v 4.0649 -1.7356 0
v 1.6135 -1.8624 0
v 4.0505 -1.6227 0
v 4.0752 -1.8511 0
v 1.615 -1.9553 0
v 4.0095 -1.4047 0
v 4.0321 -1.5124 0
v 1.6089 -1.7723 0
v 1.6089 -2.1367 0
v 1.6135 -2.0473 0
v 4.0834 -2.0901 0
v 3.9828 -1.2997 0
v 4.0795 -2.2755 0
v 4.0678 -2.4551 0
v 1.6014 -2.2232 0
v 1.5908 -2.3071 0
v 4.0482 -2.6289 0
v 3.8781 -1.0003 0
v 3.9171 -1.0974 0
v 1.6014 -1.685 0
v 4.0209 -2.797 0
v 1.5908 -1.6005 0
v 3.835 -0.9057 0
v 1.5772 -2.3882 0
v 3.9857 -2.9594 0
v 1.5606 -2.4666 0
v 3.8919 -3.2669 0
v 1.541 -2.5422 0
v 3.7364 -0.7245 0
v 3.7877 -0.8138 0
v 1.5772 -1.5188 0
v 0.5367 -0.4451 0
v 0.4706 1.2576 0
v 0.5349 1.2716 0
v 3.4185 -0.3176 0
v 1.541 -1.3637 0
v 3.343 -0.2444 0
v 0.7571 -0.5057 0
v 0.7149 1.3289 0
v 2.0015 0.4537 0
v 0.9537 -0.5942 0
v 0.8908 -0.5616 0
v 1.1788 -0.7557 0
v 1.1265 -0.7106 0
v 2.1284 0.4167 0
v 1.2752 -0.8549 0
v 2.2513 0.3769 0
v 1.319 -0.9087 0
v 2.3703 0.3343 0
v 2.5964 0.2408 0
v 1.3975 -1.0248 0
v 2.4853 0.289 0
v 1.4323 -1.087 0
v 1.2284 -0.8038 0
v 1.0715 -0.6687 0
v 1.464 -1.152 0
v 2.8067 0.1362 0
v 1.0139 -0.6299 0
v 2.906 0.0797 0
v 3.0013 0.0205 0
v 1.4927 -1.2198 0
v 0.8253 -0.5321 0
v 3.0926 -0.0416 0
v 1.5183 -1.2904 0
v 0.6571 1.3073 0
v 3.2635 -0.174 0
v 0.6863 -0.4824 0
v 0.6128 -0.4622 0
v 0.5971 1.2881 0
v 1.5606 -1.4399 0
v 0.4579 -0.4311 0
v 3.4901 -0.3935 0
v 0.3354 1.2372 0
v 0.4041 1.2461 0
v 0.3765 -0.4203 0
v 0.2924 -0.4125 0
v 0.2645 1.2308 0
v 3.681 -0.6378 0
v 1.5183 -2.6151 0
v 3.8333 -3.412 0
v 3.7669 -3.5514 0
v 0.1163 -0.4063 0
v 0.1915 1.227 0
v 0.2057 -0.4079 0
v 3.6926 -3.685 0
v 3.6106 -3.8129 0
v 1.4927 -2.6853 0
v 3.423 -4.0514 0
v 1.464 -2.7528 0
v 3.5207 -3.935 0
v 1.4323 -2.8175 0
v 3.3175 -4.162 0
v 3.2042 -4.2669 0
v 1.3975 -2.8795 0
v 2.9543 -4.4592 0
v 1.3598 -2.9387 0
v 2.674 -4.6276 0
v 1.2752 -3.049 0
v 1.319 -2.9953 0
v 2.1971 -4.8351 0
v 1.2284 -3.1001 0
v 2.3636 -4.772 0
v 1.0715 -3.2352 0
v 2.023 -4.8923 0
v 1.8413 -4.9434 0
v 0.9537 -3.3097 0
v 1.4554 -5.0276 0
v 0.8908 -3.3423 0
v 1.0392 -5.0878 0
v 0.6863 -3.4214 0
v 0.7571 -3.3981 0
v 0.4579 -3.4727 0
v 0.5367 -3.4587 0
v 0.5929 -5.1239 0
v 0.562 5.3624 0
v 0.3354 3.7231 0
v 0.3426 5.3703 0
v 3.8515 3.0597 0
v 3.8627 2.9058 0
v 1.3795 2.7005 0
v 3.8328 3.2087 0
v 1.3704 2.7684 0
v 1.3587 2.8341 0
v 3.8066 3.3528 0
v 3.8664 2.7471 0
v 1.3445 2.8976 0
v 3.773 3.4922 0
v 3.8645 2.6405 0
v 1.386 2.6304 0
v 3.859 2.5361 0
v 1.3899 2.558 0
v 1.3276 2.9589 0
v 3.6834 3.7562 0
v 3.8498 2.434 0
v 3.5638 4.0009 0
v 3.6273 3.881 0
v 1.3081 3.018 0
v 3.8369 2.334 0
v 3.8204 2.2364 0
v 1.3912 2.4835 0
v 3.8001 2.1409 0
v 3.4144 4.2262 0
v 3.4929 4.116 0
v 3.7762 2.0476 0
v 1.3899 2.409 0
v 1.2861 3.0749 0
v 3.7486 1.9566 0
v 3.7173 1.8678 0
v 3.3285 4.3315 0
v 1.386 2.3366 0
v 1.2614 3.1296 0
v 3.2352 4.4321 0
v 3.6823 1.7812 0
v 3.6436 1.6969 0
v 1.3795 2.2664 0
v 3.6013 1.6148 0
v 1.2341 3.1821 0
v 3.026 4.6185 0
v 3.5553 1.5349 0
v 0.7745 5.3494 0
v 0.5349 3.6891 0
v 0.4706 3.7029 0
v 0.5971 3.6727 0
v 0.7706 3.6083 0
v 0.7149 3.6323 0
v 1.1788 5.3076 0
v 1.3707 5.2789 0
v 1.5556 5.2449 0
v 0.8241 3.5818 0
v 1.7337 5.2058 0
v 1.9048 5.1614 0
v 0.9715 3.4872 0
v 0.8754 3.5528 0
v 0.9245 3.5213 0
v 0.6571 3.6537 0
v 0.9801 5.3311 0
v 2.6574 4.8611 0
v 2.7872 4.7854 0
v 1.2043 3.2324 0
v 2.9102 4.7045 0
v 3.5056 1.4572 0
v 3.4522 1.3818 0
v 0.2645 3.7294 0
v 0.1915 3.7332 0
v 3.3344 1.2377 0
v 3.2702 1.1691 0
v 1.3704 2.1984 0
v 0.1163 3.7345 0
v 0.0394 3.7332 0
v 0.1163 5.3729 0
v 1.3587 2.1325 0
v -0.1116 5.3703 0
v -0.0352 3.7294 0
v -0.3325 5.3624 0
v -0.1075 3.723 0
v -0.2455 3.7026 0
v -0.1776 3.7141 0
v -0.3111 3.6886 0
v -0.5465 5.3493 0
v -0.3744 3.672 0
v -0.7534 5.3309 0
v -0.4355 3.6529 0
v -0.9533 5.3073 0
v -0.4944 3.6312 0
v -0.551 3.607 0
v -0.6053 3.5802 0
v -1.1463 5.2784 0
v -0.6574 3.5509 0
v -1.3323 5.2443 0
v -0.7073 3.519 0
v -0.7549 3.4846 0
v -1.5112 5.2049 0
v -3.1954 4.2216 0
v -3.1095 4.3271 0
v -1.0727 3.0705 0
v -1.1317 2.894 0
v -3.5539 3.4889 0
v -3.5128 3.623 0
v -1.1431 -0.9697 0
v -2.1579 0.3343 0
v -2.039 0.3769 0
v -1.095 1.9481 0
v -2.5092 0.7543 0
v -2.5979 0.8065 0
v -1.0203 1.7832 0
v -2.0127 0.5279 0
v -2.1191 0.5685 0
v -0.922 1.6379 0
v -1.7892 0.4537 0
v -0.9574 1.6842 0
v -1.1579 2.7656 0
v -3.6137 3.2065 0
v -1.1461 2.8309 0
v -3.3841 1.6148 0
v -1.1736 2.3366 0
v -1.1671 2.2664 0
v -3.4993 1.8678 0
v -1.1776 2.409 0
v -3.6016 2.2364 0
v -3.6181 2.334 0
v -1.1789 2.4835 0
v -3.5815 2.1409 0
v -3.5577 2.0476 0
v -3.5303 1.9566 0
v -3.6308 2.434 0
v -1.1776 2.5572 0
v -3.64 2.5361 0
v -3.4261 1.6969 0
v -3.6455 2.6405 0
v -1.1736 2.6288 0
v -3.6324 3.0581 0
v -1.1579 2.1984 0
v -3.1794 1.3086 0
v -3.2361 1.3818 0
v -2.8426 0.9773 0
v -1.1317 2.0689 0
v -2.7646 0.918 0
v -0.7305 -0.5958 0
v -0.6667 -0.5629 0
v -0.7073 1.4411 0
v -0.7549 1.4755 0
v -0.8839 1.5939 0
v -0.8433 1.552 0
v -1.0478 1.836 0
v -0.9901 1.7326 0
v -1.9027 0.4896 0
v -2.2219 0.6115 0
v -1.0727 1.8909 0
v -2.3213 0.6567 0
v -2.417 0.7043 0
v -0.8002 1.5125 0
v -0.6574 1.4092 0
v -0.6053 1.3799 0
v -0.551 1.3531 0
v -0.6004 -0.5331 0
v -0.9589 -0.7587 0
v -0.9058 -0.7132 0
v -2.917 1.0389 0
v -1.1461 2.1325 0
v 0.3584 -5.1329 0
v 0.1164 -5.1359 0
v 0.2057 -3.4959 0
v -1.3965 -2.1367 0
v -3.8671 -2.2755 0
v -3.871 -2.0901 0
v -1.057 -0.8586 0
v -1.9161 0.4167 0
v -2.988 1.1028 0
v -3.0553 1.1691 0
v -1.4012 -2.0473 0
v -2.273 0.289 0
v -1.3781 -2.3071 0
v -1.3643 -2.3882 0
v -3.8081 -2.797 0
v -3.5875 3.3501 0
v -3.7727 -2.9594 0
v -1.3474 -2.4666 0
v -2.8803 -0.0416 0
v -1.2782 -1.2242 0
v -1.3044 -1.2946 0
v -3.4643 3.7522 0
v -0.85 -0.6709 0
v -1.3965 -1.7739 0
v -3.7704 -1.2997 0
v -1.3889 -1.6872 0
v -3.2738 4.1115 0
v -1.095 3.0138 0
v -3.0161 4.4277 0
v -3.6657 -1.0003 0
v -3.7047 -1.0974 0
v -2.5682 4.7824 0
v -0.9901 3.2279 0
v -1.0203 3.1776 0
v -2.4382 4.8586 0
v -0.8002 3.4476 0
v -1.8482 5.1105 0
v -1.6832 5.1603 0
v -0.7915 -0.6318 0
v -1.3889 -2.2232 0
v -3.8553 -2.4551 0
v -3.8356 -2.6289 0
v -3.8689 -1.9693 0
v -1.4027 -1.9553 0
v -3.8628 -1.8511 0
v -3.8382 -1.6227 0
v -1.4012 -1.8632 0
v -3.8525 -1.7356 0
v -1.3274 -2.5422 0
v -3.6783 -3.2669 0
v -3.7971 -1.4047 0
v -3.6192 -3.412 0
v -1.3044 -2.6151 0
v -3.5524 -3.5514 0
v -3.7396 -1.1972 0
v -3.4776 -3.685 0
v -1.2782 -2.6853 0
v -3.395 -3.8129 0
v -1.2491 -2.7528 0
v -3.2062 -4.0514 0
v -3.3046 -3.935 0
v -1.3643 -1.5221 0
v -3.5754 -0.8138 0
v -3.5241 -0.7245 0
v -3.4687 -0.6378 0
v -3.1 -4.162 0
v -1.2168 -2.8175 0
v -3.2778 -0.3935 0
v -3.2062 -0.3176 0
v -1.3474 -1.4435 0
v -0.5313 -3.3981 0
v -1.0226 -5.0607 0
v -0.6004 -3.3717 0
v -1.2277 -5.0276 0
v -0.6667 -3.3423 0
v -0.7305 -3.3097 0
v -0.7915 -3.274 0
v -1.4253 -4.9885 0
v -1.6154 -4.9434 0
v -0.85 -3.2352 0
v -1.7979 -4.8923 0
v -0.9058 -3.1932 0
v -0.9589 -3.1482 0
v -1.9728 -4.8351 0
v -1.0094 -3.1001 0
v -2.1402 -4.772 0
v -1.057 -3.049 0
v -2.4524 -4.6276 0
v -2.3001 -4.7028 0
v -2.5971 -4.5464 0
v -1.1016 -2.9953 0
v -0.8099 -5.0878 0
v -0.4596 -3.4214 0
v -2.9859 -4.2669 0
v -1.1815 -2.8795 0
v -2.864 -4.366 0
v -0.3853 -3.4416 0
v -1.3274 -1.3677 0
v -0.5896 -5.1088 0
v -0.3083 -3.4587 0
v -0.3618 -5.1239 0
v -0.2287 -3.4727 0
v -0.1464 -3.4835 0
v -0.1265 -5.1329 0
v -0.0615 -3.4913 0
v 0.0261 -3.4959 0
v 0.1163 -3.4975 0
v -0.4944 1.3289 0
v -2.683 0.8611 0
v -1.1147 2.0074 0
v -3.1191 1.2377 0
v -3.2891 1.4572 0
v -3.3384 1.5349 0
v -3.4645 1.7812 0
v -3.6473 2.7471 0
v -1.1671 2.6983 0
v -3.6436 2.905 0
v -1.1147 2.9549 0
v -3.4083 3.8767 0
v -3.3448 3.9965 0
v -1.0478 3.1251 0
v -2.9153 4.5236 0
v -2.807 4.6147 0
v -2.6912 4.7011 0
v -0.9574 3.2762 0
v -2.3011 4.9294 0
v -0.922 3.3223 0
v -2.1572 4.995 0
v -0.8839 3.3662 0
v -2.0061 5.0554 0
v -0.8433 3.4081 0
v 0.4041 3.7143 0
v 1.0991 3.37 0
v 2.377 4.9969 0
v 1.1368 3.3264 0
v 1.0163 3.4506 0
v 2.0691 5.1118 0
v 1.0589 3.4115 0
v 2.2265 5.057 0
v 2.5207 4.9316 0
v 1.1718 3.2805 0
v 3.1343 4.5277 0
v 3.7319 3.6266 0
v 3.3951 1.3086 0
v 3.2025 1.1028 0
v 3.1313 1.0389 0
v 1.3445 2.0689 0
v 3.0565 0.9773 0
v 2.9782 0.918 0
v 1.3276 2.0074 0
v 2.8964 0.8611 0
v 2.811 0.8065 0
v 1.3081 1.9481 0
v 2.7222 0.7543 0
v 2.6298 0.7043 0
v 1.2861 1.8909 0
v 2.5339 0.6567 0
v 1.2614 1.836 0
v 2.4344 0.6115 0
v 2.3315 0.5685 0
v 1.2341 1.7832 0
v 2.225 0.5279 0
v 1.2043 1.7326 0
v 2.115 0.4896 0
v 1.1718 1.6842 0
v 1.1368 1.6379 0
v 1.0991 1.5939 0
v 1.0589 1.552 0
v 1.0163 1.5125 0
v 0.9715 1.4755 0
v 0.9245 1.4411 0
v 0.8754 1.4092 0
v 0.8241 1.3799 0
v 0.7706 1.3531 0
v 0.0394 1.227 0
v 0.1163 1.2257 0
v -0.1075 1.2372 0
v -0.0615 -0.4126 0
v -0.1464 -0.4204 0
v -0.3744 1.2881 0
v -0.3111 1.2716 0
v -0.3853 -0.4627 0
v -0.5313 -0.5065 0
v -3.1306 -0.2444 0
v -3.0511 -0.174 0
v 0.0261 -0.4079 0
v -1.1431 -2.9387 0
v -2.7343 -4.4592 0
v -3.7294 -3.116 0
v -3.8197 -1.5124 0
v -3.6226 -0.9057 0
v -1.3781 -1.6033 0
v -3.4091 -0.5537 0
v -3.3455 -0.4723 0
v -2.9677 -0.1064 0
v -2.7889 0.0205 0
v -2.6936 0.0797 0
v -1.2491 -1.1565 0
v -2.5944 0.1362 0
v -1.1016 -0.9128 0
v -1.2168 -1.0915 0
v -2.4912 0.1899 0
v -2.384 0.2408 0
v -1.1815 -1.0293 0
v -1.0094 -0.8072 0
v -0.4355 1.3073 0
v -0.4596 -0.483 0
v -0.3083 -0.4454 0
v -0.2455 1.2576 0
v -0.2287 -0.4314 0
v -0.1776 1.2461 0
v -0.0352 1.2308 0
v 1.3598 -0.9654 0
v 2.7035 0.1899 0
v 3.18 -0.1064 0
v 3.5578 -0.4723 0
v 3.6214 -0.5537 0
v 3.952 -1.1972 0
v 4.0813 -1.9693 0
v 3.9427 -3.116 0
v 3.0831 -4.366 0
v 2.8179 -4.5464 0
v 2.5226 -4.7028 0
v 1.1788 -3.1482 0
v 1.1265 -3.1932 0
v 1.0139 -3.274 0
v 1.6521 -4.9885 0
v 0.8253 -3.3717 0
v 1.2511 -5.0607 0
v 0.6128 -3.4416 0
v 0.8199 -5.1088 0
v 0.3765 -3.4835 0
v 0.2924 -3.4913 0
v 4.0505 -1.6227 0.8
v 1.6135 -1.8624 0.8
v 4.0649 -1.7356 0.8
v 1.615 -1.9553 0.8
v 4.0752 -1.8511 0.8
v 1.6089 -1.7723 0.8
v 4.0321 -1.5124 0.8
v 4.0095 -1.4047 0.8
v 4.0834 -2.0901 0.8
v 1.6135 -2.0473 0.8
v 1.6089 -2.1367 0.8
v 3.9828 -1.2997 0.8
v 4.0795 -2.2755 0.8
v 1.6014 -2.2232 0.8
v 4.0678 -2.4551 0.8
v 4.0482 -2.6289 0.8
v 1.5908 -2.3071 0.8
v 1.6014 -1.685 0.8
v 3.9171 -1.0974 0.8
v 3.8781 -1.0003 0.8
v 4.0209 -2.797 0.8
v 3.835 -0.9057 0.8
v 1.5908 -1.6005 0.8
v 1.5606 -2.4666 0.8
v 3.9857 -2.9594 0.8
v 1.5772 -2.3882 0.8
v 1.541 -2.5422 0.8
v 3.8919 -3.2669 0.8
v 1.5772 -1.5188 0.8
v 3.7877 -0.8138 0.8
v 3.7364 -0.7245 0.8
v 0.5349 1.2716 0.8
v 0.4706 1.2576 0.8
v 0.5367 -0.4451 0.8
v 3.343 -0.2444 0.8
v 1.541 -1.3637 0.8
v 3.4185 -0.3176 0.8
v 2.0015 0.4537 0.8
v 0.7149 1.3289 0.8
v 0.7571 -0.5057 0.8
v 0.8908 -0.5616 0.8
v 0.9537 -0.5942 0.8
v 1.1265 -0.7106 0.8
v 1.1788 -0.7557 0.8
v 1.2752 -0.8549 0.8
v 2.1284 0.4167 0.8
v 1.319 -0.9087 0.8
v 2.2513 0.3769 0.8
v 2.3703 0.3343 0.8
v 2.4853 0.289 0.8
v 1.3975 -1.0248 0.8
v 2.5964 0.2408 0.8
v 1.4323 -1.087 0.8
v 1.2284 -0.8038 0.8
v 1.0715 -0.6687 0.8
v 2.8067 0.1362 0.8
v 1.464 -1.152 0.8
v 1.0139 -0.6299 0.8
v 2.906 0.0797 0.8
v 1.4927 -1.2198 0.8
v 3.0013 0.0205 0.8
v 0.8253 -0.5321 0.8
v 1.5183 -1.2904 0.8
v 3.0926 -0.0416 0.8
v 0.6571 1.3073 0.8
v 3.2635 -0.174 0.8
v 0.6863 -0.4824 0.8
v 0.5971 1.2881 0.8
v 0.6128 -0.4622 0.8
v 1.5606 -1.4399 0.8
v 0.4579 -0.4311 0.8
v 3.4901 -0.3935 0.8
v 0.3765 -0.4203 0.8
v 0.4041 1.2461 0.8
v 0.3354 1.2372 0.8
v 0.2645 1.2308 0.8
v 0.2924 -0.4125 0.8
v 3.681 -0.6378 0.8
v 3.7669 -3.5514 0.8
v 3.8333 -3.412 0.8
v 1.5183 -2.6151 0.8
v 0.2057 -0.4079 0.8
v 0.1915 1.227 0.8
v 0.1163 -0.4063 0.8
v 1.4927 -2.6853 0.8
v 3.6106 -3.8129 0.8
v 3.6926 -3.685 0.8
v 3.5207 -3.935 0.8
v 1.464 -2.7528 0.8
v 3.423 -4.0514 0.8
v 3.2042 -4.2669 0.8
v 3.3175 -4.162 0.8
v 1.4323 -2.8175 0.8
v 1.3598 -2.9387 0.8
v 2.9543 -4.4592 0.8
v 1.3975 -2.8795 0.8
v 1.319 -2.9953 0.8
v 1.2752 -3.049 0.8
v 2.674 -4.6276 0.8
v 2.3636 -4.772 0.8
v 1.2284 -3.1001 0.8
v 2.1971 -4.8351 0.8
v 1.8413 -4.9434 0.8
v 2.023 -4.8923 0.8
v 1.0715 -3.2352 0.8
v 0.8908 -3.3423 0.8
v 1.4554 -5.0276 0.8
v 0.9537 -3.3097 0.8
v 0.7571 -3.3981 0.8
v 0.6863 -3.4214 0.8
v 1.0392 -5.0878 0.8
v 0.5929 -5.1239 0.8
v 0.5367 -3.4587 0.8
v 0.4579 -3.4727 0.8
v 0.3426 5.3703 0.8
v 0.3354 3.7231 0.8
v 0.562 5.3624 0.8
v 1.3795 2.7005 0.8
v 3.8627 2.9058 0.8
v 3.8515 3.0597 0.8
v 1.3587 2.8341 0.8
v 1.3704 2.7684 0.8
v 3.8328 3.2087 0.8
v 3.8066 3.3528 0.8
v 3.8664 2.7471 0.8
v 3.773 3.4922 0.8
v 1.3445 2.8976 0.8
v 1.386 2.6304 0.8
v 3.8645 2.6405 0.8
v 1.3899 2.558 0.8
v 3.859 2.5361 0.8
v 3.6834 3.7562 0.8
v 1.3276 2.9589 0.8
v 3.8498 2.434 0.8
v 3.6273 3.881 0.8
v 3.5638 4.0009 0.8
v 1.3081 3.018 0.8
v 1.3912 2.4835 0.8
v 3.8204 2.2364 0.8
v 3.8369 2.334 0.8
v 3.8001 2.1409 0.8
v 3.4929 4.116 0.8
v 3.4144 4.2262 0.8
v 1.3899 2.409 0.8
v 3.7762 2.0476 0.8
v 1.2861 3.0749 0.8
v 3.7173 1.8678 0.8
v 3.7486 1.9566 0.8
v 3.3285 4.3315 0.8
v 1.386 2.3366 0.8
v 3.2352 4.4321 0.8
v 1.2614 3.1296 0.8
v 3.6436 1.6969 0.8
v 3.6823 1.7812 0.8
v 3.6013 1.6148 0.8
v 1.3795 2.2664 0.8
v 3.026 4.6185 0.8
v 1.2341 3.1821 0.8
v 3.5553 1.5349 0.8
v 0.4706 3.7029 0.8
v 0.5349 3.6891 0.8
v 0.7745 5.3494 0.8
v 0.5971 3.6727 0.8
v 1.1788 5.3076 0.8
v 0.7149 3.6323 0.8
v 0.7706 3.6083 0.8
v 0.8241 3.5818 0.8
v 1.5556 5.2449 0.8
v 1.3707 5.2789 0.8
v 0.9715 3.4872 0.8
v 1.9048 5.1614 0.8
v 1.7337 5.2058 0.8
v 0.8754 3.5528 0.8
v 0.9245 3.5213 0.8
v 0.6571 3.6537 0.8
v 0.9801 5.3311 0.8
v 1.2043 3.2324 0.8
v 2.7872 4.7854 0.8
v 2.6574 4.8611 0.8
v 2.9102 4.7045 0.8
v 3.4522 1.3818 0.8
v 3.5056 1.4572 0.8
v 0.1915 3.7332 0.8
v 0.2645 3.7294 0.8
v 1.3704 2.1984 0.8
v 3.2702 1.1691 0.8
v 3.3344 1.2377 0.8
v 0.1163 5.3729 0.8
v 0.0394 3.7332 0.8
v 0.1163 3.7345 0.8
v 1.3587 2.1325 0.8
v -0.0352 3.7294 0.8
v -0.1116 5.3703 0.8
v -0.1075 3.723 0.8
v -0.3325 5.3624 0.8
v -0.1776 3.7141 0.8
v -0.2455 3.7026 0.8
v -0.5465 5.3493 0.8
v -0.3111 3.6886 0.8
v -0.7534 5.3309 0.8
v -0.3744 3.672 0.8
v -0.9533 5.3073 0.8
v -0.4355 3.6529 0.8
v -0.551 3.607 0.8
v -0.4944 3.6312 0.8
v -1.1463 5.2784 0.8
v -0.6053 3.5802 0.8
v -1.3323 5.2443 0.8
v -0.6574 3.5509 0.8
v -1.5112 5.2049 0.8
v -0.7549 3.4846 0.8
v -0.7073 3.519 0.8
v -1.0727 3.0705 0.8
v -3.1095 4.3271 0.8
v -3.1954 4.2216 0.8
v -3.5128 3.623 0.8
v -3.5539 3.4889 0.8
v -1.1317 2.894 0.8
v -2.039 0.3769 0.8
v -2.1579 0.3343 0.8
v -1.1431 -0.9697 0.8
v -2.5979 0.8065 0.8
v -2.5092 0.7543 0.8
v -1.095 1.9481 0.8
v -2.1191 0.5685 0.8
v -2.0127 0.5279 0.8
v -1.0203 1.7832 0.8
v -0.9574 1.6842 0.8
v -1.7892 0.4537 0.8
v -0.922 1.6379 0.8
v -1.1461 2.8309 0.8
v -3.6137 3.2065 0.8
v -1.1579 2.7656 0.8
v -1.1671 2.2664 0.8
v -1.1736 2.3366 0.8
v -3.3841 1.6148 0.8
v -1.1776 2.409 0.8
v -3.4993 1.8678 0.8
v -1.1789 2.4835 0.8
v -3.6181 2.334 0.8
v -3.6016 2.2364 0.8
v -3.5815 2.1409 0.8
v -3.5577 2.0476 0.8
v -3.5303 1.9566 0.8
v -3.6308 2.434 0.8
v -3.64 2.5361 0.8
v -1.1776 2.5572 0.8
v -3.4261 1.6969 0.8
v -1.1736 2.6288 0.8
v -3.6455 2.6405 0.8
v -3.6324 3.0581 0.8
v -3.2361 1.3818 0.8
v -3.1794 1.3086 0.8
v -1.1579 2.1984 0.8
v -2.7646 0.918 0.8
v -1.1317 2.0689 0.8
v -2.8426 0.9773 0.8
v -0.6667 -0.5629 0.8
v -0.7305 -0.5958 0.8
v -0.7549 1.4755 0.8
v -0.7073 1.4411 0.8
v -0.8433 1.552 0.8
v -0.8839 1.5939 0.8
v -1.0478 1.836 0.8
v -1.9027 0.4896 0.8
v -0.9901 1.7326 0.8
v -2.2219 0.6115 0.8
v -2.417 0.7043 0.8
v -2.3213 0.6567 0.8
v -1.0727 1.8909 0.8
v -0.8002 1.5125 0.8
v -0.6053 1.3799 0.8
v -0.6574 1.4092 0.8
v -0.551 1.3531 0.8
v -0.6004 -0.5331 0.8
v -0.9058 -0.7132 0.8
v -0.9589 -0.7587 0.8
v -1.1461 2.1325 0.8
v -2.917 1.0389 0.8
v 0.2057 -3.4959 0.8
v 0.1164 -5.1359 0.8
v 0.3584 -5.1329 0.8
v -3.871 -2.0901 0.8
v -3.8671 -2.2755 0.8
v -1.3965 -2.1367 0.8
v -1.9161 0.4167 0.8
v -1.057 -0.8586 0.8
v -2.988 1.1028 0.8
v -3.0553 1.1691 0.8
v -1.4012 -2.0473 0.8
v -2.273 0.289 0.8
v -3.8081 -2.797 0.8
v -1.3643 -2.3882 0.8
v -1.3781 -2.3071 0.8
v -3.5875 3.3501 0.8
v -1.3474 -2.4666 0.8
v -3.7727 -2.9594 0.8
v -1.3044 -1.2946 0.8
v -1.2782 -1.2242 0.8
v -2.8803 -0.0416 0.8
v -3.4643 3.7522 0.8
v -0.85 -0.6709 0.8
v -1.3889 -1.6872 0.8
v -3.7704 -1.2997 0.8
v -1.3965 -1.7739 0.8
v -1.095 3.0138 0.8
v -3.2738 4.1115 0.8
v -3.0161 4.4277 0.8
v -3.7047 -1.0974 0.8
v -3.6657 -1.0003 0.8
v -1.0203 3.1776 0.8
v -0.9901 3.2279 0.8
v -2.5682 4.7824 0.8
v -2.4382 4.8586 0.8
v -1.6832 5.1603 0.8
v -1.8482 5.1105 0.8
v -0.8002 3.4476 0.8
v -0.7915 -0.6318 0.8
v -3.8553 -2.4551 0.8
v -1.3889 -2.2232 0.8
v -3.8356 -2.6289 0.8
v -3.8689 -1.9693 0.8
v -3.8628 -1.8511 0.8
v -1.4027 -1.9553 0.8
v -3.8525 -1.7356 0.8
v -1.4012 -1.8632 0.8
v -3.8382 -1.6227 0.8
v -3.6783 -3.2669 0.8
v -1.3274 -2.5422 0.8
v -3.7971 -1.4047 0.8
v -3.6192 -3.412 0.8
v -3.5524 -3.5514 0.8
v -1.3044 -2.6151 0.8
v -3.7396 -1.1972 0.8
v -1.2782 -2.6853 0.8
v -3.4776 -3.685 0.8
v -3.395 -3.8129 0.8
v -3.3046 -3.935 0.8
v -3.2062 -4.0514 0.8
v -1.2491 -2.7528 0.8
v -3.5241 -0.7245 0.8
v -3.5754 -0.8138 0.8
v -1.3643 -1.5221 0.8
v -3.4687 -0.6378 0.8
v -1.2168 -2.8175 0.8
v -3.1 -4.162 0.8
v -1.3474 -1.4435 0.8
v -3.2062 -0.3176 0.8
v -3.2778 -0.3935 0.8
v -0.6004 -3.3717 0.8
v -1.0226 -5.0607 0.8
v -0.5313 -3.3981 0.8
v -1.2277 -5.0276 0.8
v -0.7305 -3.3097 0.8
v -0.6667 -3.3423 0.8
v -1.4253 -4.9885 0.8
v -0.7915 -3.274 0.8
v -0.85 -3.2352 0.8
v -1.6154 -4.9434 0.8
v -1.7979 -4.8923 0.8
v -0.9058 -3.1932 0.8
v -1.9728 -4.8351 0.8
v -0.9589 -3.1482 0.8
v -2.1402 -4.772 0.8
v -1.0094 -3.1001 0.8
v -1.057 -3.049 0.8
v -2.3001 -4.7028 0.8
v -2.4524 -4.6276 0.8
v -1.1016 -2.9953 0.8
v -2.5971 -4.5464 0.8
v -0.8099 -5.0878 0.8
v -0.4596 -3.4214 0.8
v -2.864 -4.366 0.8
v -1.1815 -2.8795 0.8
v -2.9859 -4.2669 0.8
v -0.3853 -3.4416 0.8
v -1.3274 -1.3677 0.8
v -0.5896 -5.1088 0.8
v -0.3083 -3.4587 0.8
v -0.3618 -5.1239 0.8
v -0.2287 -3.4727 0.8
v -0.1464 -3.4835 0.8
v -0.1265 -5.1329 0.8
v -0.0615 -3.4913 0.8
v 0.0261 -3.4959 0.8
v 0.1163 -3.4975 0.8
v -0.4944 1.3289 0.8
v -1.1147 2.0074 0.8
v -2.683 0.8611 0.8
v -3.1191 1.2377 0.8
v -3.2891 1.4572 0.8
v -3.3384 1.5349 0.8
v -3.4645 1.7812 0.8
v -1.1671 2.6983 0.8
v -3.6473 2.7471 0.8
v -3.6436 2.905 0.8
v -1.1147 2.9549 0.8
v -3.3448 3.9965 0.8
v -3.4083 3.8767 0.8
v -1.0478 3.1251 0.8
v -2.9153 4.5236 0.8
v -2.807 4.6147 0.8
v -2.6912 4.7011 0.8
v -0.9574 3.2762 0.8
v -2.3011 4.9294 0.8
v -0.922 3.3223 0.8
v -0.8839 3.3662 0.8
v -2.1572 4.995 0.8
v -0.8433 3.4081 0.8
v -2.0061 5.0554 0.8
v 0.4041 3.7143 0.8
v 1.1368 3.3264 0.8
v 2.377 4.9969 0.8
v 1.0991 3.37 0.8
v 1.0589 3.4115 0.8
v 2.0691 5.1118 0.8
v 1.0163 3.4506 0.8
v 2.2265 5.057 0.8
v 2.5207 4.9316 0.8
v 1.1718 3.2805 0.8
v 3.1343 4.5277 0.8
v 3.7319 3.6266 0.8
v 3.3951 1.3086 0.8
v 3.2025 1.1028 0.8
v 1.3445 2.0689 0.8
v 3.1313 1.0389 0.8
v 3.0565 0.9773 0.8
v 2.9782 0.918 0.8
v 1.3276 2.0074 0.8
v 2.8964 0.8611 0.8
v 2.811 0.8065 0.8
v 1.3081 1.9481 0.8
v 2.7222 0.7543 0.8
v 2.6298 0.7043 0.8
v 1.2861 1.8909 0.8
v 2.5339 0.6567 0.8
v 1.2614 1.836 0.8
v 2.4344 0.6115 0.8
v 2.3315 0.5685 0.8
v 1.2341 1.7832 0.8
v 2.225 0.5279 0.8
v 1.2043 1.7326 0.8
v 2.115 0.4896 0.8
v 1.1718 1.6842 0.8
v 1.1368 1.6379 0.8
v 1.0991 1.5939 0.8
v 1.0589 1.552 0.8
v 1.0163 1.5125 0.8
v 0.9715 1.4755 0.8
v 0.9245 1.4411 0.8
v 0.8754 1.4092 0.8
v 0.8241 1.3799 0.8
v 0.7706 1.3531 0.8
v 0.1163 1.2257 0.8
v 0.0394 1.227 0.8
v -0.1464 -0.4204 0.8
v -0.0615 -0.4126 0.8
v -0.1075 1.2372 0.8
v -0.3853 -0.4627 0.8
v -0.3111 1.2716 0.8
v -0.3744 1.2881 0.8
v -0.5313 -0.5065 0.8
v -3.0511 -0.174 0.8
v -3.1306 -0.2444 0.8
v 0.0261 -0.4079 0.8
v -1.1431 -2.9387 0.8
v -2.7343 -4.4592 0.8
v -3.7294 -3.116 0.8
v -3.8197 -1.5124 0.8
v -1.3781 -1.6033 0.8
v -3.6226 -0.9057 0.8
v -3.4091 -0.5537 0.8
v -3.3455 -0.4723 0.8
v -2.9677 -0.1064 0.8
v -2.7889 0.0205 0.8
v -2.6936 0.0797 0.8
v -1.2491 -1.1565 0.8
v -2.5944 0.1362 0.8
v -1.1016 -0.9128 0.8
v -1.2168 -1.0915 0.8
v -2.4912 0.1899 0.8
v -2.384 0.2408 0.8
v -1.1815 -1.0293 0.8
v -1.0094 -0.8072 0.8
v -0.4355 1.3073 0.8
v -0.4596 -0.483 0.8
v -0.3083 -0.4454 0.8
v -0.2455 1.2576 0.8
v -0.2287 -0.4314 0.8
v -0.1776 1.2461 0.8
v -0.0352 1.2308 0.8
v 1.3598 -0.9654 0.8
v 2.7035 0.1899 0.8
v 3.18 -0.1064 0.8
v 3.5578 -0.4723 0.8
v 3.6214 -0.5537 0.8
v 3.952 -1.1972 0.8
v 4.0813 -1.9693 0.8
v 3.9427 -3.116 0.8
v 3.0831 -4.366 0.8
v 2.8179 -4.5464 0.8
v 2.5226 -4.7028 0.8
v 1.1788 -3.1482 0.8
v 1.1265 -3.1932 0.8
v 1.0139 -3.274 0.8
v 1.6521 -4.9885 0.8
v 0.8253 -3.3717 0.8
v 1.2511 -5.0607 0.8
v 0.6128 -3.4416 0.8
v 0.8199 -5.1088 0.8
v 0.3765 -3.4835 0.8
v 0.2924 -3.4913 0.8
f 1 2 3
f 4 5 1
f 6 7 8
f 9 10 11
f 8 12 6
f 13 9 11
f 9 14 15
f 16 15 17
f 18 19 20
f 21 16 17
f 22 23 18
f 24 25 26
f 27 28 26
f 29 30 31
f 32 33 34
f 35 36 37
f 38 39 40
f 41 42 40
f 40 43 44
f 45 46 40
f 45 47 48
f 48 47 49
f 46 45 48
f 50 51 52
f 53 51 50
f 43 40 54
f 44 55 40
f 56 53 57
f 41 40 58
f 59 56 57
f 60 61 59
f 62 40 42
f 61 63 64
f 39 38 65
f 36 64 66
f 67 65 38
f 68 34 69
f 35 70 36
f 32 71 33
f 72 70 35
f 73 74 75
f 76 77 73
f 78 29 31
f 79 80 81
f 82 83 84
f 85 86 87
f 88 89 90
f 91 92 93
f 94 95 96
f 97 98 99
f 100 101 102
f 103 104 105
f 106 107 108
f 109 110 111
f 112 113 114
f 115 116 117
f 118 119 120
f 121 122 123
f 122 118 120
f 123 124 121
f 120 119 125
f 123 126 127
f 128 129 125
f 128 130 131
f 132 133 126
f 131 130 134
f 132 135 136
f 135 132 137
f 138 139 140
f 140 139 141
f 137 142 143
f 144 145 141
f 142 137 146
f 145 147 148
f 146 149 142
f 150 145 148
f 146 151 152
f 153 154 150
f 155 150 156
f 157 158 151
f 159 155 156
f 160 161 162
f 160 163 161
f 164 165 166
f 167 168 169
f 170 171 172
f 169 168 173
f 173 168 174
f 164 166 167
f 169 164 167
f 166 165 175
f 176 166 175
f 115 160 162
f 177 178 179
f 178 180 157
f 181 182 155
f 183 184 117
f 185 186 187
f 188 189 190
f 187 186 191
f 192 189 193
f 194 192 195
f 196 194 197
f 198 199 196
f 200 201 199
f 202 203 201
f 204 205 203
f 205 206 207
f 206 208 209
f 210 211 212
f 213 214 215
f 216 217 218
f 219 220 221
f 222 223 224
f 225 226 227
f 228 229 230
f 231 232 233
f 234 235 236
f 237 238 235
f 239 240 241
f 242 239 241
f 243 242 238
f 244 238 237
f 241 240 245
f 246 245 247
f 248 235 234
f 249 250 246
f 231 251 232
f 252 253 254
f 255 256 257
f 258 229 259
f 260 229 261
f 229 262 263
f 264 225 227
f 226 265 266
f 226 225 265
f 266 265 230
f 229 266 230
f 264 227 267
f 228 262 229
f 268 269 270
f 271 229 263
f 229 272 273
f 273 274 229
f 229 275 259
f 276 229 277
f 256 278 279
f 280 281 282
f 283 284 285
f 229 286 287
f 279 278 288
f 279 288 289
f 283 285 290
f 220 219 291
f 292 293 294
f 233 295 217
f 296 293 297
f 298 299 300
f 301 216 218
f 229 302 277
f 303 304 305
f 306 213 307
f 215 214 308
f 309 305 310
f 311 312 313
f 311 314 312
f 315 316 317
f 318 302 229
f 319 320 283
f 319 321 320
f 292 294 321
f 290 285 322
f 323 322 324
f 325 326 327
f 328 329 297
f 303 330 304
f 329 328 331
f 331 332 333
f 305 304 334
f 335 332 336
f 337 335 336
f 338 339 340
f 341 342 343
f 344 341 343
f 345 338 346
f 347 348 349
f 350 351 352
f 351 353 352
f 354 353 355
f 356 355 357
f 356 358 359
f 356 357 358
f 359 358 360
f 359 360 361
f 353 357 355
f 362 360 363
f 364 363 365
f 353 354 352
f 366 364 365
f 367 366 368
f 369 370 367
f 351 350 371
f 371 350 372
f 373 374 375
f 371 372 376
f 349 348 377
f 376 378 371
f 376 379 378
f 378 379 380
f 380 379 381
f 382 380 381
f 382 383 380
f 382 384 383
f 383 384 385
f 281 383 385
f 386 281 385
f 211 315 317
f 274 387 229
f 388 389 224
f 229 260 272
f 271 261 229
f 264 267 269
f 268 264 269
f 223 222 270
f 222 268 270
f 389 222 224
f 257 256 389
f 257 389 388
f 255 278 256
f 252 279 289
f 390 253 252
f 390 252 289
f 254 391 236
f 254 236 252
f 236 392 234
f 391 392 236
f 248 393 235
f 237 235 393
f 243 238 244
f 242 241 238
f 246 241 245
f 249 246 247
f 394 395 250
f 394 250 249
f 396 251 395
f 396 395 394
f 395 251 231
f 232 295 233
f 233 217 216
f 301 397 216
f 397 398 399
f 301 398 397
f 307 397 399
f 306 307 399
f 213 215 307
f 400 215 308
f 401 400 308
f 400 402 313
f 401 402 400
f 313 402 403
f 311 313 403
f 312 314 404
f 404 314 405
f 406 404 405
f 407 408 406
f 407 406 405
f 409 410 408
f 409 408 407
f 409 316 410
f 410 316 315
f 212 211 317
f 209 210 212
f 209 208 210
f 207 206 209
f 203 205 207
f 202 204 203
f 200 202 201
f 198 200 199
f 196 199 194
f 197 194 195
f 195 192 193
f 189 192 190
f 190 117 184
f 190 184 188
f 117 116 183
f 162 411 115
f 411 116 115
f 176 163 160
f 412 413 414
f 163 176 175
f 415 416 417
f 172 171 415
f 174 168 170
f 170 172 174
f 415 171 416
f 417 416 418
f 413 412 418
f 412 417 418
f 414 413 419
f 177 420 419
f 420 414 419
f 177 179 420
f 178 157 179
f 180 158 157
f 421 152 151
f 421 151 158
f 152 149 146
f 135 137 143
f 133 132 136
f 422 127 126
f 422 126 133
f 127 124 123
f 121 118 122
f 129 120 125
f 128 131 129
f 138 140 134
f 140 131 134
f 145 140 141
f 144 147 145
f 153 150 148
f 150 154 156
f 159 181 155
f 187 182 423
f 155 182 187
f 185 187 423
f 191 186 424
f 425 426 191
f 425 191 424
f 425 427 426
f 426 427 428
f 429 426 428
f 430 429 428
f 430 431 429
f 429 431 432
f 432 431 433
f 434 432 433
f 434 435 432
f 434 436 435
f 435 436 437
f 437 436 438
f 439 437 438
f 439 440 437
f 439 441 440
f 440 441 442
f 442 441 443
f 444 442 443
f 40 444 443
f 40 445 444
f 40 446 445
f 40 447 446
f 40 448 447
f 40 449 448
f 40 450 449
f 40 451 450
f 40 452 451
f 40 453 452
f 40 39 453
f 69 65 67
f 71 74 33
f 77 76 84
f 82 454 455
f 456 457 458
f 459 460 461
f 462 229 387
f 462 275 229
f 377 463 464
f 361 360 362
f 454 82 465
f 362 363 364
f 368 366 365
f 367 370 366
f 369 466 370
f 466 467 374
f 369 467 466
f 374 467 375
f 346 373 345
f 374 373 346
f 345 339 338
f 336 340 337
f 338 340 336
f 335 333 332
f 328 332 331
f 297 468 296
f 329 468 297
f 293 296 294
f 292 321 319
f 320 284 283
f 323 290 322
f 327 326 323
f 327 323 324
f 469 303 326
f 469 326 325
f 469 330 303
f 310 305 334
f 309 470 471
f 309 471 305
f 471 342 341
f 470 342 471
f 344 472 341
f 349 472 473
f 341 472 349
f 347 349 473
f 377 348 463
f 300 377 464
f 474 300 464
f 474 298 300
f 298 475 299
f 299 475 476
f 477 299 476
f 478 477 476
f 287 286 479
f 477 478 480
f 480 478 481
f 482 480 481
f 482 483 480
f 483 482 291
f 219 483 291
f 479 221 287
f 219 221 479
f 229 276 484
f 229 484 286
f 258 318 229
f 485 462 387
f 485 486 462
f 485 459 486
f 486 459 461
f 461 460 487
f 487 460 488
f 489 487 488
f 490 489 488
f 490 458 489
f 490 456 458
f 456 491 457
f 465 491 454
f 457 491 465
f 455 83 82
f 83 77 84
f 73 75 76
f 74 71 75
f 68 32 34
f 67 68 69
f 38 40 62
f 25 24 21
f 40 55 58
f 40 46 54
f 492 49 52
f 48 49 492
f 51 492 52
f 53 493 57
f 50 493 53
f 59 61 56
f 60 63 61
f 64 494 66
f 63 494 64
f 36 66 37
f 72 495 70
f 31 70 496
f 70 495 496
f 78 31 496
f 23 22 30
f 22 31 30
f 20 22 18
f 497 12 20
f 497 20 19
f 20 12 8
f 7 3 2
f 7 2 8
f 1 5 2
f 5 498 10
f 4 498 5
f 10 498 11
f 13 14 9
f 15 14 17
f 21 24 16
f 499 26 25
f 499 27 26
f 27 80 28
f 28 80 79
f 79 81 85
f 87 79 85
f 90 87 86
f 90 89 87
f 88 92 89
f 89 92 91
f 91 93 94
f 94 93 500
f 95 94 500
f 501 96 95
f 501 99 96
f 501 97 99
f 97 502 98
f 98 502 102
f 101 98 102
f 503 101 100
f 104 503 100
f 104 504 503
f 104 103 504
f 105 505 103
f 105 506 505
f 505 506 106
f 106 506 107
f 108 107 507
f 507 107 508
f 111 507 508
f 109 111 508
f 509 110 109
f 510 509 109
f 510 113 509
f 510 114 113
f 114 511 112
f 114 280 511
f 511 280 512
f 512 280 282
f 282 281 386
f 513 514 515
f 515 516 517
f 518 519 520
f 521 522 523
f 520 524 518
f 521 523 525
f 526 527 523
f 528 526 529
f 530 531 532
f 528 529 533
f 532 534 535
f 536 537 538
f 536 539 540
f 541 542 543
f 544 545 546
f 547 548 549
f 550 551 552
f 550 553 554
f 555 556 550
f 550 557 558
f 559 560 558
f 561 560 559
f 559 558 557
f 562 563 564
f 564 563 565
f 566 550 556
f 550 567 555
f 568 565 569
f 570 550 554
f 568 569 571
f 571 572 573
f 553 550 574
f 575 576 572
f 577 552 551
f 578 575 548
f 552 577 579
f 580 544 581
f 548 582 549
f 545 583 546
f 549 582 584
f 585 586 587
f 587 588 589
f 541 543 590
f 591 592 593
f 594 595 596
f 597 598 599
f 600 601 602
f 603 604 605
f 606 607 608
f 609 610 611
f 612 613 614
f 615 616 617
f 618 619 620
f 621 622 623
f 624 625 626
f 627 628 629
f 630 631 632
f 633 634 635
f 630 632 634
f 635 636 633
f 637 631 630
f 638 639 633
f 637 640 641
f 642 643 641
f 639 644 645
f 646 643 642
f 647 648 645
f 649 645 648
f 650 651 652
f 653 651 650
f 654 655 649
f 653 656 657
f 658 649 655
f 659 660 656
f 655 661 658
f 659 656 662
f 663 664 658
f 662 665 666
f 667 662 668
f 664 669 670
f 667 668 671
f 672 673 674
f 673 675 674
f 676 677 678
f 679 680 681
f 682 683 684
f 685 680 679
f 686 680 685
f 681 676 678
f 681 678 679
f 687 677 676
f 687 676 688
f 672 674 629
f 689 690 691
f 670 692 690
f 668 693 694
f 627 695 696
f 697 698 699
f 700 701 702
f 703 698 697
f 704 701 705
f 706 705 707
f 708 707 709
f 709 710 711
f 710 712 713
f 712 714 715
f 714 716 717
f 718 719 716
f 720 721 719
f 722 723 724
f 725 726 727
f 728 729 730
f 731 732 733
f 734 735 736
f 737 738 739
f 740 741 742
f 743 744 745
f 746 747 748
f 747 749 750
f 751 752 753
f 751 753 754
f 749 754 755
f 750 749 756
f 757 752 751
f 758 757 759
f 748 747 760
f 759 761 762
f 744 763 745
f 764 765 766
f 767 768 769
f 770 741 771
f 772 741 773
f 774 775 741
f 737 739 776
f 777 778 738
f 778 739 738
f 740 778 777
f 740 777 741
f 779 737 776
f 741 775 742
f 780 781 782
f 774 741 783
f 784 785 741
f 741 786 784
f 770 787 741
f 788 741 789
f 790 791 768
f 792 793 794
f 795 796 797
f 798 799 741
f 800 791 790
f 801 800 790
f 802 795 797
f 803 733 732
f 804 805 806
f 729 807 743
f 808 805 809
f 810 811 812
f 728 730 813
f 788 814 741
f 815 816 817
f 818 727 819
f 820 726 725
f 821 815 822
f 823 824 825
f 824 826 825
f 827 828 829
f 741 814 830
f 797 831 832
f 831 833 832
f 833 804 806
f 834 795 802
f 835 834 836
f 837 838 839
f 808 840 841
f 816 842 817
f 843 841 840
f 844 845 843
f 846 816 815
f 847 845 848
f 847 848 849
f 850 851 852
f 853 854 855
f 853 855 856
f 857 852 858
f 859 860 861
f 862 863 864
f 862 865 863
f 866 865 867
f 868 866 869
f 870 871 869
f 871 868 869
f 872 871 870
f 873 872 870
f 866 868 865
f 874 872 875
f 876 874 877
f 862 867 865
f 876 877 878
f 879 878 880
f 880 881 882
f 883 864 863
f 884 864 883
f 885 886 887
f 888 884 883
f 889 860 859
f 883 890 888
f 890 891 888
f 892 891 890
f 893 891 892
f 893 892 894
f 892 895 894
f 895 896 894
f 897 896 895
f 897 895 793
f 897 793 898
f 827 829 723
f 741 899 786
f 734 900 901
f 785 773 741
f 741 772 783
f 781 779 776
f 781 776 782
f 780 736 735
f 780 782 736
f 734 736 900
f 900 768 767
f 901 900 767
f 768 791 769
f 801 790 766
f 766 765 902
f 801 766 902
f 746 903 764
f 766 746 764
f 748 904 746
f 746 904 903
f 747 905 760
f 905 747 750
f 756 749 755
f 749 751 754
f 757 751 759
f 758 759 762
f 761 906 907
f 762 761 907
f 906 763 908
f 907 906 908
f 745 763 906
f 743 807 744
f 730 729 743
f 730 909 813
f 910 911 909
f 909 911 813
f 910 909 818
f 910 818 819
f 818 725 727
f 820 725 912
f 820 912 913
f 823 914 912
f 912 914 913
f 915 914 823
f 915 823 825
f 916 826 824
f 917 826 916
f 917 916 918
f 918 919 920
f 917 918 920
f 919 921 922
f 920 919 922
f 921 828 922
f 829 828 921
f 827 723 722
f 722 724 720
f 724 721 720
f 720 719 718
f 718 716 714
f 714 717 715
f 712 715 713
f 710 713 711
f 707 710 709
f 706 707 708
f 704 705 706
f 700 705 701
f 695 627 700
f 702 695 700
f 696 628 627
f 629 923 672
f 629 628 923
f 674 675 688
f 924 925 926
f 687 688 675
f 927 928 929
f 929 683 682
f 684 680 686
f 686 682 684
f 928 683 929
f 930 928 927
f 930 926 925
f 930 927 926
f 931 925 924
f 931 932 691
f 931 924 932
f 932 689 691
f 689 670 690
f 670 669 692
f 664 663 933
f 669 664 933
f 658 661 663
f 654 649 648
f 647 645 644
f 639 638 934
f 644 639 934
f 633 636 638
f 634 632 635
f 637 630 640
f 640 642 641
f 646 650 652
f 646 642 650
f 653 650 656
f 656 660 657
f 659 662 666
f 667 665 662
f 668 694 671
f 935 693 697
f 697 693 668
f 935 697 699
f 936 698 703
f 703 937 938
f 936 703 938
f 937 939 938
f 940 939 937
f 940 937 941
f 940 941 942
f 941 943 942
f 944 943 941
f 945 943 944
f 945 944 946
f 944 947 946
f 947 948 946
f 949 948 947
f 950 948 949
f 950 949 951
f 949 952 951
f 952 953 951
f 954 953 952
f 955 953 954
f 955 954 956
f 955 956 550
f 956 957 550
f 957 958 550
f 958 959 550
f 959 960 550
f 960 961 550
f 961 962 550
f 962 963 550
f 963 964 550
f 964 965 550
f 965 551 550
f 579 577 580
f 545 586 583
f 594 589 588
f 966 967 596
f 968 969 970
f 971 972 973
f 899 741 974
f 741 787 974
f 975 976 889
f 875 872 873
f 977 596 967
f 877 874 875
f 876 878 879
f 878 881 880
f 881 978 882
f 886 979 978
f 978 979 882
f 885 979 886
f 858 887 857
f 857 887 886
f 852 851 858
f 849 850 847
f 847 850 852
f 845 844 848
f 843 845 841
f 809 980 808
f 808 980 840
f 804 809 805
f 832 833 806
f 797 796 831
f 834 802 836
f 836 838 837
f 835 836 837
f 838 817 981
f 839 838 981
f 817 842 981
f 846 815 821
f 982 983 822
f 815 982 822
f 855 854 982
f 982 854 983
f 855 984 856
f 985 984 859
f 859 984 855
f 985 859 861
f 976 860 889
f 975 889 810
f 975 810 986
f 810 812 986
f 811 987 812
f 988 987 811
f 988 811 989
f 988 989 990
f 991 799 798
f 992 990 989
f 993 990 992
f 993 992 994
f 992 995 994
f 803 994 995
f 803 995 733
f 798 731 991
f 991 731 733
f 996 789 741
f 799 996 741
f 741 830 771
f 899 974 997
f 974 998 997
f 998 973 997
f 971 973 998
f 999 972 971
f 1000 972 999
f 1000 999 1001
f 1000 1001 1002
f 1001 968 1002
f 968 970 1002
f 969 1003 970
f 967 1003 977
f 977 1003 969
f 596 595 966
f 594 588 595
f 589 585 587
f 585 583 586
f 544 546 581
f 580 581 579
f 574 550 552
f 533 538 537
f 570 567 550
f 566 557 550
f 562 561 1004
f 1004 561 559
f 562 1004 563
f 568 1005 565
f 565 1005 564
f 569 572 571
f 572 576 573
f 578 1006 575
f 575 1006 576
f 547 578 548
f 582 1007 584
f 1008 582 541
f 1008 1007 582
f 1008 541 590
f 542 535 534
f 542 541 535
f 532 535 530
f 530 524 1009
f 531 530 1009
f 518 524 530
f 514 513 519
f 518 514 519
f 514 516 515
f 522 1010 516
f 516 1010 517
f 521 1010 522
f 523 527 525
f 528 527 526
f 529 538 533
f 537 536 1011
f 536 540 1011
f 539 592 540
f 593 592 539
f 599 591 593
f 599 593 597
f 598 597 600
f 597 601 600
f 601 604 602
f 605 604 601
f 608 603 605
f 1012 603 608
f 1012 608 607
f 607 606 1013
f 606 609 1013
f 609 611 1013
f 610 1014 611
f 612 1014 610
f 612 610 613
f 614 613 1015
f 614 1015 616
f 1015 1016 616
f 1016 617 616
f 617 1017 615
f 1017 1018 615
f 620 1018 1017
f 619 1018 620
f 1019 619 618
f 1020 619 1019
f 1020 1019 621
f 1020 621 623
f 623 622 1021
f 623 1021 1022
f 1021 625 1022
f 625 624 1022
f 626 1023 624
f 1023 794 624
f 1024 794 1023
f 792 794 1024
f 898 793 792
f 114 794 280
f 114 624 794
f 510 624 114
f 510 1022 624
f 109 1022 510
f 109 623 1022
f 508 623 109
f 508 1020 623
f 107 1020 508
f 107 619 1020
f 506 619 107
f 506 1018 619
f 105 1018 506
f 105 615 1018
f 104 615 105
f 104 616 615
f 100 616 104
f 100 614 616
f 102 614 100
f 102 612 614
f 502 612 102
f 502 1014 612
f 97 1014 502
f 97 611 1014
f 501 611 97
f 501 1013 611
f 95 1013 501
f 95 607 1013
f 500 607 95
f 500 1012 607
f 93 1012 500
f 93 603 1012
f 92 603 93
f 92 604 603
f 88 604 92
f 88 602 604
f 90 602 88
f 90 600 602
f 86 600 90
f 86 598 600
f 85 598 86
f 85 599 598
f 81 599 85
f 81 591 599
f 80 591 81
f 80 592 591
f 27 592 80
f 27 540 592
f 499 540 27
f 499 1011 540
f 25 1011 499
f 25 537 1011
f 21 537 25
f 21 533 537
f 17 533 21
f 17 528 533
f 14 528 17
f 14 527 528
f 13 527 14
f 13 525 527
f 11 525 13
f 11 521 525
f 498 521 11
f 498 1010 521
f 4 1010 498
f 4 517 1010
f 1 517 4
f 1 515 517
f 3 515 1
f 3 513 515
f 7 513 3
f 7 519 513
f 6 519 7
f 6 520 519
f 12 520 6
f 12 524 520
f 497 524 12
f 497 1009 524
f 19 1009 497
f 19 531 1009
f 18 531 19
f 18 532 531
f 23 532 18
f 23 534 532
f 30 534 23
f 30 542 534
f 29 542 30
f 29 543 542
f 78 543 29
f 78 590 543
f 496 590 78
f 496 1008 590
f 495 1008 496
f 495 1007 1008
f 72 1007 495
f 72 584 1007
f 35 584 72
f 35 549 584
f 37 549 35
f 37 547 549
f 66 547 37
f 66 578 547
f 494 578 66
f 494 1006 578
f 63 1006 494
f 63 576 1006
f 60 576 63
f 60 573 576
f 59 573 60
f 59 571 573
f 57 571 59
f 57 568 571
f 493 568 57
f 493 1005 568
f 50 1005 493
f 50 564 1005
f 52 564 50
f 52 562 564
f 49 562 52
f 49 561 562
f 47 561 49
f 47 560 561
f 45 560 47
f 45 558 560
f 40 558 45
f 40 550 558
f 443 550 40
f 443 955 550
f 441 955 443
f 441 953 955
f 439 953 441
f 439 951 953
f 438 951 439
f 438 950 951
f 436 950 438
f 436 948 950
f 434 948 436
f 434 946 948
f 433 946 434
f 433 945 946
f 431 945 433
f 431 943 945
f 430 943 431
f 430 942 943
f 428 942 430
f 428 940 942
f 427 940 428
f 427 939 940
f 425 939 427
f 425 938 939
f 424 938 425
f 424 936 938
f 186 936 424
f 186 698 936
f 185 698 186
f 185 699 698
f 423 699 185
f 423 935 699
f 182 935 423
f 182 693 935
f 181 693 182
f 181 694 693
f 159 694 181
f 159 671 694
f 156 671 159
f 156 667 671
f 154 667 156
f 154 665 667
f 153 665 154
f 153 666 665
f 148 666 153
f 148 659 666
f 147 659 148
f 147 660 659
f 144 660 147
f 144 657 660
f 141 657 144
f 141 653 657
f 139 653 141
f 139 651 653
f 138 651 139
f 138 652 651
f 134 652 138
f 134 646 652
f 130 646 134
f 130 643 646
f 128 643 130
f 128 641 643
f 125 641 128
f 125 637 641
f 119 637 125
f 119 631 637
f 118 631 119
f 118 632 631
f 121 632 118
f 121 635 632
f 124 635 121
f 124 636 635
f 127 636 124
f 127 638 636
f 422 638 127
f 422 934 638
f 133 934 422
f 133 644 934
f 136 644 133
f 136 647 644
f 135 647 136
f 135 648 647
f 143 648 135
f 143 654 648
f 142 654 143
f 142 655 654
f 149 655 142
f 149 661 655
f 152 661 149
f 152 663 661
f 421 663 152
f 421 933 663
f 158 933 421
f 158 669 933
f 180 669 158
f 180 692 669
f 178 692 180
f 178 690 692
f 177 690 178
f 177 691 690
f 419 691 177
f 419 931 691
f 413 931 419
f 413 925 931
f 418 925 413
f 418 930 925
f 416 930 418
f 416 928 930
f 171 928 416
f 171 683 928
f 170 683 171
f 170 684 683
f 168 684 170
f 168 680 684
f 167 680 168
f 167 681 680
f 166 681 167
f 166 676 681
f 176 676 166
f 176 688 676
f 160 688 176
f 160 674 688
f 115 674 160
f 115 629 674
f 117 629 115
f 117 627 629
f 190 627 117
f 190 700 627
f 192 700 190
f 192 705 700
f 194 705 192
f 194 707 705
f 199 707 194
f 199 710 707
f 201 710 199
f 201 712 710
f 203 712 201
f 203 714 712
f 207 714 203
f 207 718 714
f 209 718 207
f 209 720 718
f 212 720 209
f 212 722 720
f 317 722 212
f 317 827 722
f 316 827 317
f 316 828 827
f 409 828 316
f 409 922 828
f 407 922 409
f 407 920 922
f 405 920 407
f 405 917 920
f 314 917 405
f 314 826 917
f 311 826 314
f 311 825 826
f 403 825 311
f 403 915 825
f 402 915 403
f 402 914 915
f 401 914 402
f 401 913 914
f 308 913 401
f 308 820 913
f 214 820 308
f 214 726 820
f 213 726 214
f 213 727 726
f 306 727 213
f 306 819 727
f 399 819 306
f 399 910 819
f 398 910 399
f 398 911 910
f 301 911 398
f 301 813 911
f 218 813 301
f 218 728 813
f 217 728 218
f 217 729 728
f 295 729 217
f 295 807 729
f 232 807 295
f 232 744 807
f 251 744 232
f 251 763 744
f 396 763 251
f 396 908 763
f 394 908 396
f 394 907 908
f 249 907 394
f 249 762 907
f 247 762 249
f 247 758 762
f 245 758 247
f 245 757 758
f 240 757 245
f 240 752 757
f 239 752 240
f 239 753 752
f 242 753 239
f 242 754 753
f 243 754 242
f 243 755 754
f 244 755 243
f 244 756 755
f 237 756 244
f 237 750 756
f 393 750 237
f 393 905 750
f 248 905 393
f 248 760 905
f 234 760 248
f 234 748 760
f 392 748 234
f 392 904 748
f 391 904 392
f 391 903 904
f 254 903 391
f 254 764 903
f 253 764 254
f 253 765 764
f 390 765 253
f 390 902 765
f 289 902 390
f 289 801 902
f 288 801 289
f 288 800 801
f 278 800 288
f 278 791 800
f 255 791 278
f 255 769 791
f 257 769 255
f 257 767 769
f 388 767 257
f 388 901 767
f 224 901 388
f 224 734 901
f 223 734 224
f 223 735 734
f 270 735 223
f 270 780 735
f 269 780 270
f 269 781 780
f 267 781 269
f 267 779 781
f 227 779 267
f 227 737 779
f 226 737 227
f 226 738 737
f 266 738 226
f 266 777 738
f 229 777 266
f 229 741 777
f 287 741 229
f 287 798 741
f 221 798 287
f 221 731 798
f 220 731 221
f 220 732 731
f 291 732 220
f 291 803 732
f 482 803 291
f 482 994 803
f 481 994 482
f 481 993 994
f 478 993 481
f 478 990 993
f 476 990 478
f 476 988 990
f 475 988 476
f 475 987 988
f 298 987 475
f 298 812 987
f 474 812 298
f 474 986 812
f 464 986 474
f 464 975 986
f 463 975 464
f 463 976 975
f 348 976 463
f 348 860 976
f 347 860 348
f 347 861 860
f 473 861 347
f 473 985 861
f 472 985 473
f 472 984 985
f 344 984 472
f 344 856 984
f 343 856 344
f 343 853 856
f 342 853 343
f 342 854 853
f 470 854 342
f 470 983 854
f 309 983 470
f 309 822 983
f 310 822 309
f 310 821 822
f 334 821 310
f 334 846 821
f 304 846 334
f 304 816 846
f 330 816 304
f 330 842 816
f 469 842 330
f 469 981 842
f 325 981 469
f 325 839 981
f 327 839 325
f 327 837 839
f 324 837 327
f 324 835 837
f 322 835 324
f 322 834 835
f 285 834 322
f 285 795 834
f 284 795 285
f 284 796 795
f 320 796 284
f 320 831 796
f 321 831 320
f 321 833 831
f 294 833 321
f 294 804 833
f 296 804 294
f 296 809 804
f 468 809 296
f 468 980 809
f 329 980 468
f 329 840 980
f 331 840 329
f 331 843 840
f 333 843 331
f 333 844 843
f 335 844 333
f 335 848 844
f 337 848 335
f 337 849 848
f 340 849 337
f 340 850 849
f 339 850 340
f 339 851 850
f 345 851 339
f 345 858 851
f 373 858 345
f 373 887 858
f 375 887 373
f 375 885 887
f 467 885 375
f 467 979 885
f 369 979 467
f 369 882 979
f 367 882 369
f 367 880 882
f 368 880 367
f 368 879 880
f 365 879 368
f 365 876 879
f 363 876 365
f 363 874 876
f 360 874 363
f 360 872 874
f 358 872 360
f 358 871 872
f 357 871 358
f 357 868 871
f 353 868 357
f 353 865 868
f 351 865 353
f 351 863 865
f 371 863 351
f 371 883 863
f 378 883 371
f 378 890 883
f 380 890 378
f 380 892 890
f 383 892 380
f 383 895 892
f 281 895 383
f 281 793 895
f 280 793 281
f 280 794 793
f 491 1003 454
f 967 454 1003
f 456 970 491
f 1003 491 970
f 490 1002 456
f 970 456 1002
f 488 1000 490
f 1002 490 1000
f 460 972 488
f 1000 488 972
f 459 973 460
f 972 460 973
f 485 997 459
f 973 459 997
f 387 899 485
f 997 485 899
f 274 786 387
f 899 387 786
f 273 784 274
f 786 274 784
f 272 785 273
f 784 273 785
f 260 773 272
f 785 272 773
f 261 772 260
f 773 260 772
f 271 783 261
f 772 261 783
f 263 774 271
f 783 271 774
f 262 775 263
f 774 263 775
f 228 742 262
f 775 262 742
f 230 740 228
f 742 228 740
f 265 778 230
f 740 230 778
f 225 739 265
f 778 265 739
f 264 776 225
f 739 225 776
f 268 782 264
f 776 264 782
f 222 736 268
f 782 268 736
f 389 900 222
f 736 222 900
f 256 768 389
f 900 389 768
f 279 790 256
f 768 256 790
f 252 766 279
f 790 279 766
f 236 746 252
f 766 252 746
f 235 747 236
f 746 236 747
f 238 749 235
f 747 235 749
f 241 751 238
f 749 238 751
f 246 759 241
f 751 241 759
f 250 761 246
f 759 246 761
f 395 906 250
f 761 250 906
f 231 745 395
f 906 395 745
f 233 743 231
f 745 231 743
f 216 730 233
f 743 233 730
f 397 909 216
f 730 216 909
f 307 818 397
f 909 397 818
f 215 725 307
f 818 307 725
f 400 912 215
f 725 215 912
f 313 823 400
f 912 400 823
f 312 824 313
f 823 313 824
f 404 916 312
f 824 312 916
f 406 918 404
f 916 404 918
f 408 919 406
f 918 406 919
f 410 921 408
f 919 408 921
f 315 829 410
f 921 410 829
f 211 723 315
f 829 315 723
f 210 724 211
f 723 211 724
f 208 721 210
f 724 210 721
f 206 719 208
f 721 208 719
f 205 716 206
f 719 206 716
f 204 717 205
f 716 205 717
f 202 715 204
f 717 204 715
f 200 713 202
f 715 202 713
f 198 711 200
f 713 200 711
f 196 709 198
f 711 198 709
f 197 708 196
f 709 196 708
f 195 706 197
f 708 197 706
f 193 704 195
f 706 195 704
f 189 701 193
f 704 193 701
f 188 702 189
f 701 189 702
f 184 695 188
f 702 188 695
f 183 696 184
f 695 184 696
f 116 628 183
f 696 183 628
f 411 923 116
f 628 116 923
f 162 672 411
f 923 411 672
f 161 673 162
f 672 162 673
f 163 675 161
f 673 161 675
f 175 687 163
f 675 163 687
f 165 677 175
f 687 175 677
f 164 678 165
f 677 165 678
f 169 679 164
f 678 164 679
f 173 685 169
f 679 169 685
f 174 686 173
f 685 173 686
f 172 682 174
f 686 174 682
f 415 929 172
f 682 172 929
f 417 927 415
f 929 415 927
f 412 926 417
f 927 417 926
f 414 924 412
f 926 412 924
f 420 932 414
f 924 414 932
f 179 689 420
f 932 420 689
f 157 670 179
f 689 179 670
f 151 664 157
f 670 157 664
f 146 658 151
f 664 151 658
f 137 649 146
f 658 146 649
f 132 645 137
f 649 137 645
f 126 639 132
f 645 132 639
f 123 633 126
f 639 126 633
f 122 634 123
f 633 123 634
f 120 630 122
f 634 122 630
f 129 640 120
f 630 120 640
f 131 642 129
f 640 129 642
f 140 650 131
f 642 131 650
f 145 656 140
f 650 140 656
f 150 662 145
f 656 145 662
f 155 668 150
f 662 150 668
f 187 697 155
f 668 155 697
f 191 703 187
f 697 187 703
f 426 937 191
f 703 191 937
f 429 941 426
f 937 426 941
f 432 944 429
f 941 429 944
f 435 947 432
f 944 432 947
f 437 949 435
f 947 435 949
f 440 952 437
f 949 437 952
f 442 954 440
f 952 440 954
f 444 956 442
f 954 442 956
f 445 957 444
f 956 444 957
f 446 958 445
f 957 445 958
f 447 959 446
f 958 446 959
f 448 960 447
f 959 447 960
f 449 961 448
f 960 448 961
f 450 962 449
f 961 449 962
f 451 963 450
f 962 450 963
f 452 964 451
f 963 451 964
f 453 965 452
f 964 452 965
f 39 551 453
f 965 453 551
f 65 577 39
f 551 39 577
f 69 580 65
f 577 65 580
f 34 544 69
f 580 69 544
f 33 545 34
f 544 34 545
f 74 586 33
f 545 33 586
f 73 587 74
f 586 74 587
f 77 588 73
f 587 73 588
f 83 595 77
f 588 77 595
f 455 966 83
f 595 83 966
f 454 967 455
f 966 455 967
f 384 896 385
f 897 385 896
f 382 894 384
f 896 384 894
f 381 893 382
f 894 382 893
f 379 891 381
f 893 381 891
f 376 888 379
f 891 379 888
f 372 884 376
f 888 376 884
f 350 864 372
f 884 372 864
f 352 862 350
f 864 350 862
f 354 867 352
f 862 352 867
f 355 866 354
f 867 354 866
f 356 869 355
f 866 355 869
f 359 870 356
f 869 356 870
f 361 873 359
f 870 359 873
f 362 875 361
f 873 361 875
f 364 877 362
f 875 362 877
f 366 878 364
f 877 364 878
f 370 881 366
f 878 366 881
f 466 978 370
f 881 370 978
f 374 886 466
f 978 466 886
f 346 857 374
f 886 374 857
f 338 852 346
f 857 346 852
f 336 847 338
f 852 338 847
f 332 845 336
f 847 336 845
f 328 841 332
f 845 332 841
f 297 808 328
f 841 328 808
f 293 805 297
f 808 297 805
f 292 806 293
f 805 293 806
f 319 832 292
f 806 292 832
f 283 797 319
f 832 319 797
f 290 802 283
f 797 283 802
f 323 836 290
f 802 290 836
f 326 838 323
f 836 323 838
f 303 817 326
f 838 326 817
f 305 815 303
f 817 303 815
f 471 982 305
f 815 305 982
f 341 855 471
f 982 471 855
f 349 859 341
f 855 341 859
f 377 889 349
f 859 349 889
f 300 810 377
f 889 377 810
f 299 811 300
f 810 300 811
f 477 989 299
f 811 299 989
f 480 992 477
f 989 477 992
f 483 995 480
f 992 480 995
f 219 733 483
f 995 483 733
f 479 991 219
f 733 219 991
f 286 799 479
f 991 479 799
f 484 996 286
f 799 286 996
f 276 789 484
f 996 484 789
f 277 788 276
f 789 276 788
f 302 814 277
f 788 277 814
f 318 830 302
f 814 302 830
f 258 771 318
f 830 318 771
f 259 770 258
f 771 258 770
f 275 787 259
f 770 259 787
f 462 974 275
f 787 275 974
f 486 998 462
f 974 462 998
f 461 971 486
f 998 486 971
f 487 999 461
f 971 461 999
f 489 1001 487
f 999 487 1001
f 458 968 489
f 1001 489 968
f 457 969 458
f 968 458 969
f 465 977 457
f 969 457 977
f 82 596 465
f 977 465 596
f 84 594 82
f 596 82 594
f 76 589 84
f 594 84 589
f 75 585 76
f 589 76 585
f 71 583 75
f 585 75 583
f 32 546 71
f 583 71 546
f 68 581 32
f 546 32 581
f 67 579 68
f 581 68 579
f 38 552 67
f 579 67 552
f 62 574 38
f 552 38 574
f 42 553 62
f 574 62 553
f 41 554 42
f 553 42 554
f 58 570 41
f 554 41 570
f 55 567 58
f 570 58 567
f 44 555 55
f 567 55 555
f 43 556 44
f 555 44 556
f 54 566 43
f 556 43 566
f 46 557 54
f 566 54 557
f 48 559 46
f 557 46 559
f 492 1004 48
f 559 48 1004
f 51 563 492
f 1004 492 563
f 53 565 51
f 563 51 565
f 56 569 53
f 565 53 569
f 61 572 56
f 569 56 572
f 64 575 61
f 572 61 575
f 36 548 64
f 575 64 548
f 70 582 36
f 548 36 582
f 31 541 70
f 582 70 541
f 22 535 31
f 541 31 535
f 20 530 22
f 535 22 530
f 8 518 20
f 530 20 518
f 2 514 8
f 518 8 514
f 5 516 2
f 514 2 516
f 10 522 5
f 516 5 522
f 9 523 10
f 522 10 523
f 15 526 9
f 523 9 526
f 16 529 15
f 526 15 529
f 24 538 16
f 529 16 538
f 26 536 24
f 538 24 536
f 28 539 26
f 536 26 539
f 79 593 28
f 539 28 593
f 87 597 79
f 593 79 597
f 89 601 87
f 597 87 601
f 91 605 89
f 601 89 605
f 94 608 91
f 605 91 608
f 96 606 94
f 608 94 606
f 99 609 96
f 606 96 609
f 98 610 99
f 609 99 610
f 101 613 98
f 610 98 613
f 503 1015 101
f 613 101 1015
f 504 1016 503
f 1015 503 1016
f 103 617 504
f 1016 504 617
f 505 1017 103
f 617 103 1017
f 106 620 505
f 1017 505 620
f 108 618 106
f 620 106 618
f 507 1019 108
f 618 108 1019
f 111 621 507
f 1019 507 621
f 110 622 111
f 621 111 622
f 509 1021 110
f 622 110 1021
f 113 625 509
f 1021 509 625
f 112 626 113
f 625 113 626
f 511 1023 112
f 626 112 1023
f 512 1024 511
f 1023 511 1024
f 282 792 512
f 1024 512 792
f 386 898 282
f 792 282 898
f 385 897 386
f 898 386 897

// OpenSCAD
//------------------------------------------------------
// Mark
// Simple texte
// 5@xes 04/03/2022
//------------------------------------------------------

$fn=120;
// font = "Roboto:style=Bold";
// font = "Leelawadee:style=Bold";
font = "Gill Sans MT:style=Bold";

letter_height = 0.8;
letter_size =10;

translate([0,0,0]) letter("8");


module letter(Txt) {
  color("Red")
  linear_extrude(height = letter_height) {
    text(Txt, size = letter_size, font = font, halign = "center", valign = "center");
  }
}                
